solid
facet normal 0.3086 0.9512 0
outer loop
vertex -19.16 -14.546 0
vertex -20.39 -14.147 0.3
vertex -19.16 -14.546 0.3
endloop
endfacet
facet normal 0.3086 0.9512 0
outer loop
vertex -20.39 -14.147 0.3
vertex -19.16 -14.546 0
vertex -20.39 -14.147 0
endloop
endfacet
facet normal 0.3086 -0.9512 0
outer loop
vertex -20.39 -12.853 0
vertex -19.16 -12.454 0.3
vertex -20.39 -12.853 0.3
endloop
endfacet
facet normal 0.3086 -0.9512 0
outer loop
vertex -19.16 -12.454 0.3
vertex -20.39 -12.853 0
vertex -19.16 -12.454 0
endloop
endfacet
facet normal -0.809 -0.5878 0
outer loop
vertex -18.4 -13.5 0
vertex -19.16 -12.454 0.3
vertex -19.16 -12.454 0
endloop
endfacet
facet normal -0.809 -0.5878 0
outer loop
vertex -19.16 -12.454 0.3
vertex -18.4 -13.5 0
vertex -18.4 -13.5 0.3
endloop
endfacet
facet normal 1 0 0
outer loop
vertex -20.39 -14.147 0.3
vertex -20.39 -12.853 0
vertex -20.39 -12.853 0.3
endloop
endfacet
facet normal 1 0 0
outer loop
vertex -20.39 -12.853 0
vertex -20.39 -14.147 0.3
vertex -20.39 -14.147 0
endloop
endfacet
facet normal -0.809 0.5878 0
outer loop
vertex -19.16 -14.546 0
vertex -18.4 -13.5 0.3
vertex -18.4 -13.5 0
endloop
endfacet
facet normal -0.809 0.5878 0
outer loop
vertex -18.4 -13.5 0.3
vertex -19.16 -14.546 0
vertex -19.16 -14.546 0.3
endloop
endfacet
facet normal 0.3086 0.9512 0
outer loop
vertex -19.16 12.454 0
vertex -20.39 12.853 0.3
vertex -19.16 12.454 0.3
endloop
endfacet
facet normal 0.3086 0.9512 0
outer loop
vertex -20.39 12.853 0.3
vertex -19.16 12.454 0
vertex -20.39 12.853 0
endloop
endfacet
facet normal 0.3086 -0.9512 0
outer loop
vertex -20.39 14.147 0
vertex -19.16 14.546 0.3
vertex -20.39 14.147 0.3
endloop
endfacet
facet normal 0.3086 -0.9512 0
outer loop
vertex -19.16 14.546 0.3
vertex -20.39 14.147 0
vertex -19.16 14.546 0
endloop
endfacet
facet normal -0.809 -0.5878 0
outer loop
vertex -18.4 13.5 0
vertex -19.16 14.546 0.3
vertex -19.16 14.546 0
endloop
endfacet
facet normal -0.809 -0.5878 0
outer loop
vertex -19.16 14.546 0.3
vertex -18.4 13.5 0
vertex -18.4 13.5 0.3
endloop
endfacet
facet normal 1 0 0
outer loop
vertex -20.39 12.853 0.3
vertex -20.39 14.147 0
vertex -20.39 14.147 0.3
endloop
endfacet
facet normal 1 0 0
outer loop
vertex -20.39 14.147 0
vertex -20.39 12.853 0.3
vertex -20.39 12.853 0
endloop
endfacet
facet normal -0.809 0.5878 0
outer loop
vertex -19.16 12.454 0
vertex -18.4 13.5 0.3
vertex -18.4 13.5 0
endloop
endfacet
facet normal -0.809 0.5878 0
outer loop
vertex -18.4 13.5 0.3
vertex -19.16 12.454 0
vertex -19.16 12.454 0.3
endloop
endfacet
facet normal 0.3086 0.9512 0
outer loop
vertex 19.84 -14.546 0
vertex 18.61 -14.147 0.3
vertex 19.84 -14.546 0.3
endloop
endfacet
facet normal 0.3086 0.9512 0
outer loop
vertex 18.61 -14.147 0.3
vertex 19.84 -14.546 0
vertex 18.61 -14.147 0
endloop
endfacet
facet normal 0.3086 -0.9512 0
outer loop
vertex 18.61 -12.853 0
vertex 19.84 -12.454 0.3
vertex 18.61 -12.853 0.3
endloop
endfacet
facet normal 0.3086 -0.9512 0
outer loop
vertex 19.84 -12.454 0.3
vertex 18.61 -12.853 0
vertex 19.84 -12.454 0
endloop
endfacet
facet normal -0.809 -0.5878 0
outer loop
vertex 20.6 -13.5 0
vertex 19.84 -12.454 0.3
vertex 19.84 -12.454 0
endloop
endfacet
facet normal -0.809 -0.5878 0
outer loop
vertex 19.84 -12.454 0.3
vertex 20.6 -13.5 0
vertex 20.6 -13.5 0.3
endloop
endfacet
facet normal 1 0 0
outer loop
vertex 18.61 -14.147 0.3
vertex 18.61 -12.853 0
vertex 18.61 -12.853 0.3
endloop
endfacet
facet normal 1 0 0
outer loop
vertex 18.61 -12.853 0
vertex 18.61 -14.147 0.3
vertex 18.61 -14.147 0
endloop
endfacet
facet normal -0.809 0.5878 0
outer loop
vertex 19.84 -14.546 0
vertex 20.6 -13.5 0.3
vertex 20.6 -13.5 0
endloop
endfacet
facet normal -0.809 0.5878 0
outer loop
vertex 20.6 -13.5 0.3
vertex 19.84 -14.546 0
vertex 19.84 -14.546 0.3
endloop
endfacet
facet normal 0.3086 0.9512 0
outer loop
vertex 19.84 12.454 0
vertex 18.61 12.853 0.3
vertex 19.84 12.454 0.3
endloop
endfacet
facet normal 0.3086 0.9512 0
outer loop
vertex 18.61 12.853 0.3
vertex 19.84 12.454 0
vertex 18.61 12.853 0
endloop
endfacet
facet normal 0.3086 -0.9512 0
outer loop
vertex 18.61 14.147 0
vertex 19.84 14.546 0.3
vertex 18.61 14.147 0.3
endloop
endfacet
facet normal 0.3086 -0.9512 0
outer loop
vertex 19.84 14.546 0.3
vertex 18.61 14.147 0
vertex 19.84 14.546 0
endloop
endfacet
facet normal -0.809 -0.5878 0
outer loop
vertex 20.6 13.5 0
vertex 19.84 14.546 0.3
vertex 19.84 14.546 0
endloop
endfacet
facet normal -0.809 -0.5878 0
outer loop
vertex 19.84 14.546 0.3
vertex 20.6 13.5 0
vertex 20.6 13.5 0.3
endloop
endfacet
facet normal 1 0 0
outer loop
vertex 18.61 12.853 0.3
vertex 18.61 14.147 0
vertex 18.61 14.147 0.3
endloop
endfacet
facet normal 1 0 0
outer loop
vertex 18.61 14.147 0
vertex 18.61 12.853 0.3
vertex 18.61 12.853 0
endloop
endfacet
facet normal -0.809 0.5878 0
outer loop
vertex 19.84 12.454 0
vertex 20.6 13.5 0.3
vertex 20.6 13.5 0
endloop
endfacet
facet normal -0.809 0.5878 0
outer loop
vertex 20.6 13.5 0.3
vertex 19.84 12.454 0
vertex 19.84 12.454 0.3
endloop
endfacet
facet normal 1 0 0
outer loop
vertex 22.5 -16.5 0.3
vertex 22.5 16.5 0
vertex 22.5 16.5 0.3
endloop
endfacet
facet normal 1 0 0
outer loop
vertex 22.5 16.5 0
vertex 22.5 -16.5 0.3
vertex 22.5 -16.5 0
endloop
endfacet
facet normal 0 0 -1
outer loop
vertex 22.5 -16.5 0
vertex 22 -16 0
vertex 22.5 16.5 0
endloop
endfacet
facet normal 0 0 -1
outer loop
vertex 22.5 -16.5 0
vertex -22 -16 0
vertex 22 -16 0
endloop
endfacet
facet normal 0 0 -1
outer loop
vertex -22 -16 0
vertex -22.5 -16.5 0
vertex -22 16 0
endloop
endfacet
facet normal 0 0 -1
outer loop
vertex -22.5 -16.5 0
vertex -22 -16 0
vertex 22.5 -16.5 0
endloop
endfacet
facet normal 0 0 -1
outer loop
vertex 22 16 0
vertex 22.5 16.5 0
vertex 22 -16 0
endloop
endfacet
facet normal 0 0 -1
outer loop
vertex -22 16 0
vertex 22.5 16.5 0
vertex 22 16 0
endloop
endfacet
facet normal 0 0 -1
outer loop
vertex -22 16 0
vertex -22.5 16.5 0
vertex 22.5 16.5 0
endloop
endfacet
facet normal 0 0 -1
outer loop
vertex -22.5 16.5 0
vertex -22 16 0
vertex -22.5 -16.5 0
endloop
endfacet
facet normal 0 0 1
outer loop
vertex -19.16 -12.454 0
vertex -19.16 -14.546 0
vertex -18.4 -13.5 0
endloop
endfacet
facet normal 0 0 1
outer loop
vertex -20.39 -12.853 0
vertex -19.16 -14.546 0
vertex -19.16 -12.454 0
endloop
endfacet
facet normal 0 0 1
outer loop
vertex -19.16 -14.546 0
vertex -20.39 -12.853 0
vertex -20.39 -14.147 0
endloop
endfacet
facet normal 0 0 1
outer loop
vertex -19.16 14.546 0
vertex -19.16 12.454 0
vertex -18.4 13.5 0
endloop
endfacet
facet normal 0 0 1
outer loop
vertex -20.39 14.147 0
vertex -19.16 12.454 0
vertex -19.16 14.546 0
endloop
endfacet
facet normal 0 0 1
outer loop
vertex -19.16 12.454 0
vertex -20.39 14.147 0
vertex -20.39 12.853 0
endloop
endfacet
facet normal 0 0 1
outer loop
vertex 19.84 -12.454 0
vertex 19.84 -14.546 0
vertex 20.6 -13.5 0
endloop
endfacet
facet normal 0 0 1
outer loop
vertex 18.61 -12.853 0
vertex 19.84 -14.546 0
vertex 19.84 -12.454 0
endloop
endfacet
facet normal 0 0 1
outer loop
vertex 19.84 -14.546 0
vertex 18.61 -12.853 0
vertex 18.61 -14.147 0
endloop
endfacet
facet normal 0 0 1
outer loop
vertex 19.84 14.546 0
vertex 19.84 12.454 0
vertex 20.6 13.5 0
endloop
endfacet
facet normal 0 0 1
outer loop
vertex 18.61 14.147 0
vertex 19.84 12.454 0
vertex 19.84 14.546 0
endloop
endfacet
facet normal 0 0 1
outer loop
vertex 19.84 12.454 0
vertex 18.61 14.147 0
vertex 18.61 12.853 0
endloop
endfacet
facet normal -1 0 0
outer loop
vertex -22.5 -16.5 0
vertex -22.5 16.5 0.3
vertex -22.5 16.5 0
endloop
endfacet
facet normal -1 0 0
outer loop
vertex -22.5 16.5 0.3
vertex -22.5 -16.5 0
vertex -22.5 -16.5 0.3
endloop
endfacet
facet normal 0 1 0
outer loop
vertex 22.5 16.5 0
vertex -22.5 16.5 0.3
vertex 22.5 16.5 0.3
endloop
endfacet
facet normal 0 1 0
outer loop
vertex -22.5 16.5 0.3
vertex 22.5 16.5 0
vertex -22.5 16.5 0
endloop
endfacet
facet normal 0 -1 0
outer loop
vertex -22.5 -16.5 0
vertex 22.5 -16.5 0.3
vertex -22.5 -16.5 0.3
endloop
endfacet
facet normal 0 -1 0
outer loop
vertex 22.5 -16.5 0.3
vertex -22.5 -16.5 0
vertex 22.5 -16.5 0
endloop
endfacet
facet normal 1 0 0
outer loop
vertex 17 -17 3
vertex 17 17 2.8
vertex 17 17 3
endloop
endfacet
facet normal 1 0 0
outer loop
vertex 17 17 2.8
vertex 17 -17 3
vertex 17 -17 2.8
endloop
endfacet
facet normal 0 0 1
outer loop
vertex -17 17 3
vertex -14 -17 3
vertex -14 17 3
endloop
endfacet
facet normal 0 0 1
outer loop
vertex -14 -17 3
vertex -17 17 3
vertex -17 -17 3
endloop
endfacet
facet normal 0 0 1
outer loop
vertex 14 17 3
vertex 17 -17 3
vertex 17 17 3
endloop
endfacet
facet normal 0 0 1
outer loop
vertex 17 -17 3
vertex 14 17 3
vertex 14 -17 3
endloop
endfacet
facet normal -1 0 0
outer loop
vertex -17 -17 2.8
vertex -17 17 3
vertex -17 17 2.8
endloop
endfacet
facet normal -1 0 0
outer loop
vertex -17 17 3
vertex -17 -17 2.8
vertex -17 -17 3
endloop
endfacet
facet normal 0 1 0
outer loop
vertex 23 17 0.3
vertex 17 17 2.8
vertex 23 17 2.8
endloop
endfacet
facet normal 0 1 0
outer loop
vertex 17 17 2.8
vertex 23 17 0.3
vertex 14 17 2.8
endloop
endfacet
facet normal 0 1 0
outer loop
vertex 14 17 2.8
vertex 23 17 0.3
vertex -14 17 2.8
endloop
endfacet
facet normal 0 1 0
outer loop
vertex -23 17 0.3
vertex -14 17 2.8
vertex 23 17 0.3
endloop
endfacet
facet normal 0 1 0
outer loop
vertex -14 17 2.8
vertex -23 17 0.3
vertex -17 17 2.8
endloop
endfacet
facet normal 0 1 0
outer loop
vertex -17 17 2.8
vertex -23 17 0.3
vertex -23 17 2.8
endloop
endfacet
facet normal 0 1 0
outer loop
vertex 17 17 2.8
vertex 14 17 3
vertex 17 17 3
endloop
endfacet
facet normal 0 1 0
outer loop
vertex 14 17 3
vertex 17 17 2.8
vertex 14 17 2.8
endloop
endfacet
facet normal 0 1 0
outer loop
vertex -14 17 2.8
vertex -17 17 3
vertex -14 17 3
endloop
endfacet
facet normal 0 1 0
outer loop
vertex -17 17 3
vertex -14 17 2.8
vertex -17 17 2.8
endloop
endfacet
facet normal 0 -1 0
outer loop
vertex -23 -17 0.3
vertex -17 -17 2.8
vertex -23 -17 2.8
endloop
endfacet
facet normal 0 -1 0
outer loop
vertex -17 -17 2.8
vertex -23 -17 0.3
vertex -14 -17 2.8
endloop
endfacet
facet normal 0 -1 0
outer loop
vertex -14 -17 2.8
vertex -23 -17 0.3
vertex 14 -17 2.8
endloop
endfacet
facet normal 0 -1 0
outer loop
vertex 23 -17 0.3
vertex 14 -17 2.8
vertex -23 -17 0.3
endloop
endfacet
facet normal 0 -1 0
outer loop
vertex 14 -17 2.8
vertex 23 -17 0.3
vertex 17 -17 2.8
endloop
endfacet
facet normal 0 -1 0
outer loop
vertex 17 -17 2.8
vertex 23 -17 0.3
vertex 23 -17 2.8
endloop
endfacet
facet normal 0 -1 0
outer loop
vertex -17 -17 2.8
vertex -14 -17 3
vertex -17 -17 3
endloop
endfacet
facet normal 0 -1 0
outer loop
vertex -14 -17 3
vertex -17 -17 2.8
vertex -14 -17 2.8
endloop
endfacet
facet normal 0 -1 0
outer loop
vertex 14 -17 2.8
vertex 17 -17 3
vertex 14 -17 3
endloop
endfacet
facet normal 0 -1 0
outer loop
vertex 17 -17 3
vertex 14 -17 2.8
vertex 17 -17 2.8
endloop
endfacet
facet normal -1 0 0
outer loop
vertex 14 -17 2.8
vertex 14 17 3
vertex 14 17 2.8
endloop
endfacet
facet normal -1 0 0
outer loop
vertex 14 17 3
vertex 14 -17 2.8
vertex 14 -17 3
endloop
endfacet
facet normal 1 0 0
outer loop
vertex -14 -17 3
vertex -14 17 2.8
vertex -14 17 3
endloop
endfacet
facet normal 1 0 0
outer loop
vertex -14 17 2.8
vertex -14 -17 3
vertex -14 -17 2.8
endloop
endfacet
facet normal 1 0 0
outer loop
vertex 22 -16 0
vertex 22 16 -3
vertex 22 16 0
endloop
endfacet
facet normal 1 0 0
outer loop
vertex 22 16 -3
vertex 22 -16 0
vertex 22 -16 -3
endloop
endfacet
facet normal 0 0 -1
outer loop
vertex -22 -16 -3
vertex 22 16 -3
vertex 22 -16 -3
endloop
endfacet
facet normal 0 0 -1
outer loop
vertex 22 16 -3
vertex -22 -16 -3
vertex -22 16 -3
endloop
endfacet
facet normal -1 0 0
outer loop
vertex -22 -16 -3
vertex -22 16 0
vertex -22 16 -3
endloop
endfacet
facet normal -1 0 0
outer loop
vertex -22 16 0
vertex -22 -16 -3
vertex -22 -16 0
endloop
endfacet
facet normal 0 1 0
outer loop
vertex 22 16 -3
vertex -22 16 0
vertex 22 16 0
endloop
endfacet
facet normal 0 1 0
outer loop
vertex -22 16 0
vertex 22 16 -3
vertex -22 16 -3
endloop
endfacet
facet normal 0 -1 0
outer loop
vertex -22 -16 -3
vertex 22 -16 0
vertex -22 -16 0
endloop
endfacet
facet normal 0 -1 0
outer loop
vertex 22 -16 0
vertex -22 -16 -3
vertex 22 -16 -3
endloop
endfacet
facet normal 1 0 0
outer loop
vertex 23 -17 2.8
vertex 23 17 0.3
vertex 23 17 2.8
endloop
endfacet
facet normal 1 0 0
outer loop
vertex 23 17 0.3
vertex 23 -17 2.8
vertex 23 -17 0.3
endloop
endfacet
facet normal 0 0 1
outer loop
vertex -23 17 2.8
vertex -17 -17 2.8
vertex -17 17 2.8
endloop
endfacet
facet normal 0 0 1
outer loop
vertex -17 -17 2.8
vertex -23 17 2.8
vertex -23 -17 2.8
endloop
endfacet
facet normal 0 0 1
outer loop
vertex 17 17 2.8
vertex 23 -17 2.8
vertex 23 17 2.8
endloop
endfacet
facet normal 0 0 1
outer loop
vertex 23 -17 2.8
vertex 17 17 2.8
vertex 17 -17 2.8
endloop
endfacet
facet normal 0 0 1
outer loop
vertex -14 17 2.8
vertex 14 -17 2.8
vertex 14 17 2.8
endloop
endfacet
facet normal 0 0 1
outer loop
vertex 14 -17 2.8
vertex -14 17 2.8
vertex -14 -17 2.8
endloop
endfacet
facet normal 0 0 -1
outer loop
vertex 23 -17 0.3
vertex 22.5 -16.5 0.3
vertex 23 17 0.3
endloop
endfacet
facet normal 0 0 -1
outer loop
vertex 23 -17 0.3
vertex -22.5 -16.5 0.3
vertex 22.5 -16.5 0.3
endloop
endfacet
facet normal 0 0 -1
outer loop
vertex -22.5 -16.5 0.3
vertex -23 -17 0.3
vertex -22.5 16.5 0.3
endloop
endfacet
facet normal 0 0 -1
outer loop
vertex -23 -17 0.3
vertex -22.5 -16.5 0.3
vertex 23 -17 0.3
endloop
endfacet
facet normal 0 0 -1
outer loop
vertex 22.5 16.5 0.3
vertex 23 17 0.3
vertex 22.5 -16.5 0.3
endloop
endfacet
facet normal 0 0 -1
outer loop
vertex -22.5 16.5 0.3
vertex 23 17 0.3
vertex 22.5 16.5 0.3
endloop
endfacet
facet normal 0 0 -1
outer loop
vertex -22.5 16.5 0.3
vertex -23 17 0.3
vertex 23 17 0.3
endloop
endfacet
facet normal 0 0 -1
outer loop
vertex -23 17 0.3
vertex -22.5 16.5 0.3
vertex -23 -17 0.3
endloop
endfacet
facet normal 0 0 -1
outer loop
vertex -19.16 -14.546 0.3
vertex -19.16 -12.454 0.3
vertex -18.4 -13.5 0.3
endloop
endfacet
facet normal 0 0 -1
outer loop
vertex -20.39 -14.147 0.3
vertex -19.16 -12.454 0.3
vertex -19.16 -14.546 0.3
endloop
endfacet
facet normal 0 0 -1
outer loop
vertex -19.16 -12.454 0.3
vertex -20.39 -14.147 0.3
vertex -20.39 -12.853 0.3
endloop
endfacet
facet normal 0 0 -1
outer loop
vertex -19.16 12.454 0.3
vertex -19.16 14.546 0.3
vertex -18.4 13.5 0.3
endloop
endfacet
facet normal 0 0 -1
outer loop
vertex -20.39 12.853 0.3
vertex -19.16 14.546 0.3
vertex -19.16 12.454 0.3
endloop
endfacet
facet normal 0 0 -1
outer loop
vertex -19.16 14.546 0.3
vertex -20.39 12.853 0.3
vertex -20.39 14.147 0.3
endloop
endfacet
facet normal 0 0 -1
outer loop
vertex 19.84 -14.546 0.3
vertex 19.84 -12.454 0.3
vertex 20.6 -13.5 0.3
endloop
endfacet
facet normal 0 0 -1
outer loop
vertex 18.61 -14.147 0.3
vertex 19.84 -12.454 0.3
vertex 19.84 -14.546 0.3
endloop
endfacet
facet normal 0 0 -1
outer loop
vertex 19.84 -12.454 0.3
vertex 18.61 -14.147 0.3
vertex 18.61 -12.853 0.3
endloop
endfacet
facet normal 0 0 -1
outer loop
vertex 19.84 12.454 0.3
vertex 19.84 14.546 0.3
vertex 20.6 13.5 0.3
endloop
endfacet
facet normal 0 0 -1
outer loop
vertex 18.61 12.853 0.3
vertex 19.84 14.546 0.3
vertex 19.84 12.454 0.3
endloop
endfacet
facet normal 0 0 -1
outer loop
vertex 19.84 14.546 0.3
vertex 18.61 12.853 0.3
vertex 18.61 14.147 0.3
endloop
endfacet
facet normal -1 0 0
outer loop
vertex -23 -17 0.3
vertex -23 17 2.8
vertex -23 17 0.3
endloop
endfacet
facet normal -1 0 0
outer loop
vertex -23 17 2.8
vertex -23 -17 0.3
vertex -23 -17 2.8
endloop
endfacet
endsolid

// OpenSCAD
// Parameters
overall_width_mm = 46.0; //[23.0:92.0:0.5]
overall_height_mm = 34.0; //[17.0:68.0:0.5]
display_thickness_mm = 2.5; //[1.5:5.0:0.25]
overall_thickness_mm = 6.0; //[3.0:12.0:0.25]
pcb_thickness_mm = 1.6; //[0.8:3.2:0.1]
pcb_margin_xy_mm = 0.5; //[0.0:2.0:0.1]
pcb_offset_z_mm = 1.0; //[0.0:4.0:0.25]
active_area_width_mm = 28.0; //[14.0:56.0:0.5]
active_area_height_mm = 35.0; //[17.5:70.0:0.5]
bezel_frame_thickness_mm = 1.2; //[0.6:3.0:0.1]
bezel_border_mm = 3.0; //[1.0:8.0:0.25]
rear_clearance_height_mm = 3.0; //[1.0:8.0:0.25]
rear_clearance_margin_xy_mm = 1.0; //[0.0:4.0:0.25]
mount_hole_diameter_mm = 2.2; //[1.0:4.5:0.1]
mount_hole_edge_offset_mm = 3.0; //[1.5:6.0:0.25]
overlap_mm = 1.0; //[0.5:2.0:0.1]

// Display module
module display() {
  color([0.85, 0.85, 0.8]) {
    translate([0, 0, overall_thickness_mm/2 - bezel_frame_thickness_mm - display_thickness_mm/2 + overlap_mm])
      cube([overall_width_mm, overall_height_mm, display_thickness_mm], center=true);
  }
}

// Mod module
module mod() {
  color([0.0, 0.4, 0.2]) {
    // Rear clearance volume
    translate([0, 0, -overall_thickness_mm/2 + rear_clearance_height_mm/2])
      cube([overall_width_mm - 2*rear_clearance_margin_xy_mm, overall_height_mm - 2*rear_clearance_margin_xy_mm, rear_clearance_height_mm], center=true);
    
    // PCB body with drilled holes
    difference() {
      translate([0, 0, -overall_thickness_mm/2 + rear_clearance_height_mm + pcb_thickness_mm/2])
        cube([overall_width_mm - 2*pcb_margin_xy_mm, overall_height_mm - 2*pcb_margin_xy_mm, pcb_thickness_mm], center=true);
      
      // Mount holes
      for (x = [-1, 1], y = [-1, 1]) {
        translate([x * ((overall_width_mm - 2*pcb_margin_xy_mm)/2 - mount_hole_edge_offset_mm),
                   y * ((overall_height_mm - 2*pcb_margin_xy_mm)/2 - mount_hole_edge_offset_mm),
                   -overall_thickness_mm/2 + rear_clearance_height_mm + pcb_thickness_mm/2])
          cylinder(r=mount_hole_diameter_mm/2, h=pcb_thickness_mm + 2*overlap_mm, center=true);
      }
    }
    
    // Front bezel frame
    difference() {
      translate([0, 0, overall_thickness_mm/2 - bezel_frame_thickness_mm/2])
        cube([min(overall_width_mm, active_area_width_mm + 2*bezel_border_mm), min(overall_height_mm, active_area_height_mm + 2*bezel_border_mm), bezel_frame_thickness_mm], center=true);
      
      translate([0, 0, overall_thickness_mm/2 - bezel_frame_thickness_mm/2])
        cube([active_area_width_mm, active_area_height_mm, bezel_frame_thickness_mm + 2*overlap_mm], center=true);
    }
  }
}

// Assembly
module assembly() {
  display();
  mod();
}

assembly();
